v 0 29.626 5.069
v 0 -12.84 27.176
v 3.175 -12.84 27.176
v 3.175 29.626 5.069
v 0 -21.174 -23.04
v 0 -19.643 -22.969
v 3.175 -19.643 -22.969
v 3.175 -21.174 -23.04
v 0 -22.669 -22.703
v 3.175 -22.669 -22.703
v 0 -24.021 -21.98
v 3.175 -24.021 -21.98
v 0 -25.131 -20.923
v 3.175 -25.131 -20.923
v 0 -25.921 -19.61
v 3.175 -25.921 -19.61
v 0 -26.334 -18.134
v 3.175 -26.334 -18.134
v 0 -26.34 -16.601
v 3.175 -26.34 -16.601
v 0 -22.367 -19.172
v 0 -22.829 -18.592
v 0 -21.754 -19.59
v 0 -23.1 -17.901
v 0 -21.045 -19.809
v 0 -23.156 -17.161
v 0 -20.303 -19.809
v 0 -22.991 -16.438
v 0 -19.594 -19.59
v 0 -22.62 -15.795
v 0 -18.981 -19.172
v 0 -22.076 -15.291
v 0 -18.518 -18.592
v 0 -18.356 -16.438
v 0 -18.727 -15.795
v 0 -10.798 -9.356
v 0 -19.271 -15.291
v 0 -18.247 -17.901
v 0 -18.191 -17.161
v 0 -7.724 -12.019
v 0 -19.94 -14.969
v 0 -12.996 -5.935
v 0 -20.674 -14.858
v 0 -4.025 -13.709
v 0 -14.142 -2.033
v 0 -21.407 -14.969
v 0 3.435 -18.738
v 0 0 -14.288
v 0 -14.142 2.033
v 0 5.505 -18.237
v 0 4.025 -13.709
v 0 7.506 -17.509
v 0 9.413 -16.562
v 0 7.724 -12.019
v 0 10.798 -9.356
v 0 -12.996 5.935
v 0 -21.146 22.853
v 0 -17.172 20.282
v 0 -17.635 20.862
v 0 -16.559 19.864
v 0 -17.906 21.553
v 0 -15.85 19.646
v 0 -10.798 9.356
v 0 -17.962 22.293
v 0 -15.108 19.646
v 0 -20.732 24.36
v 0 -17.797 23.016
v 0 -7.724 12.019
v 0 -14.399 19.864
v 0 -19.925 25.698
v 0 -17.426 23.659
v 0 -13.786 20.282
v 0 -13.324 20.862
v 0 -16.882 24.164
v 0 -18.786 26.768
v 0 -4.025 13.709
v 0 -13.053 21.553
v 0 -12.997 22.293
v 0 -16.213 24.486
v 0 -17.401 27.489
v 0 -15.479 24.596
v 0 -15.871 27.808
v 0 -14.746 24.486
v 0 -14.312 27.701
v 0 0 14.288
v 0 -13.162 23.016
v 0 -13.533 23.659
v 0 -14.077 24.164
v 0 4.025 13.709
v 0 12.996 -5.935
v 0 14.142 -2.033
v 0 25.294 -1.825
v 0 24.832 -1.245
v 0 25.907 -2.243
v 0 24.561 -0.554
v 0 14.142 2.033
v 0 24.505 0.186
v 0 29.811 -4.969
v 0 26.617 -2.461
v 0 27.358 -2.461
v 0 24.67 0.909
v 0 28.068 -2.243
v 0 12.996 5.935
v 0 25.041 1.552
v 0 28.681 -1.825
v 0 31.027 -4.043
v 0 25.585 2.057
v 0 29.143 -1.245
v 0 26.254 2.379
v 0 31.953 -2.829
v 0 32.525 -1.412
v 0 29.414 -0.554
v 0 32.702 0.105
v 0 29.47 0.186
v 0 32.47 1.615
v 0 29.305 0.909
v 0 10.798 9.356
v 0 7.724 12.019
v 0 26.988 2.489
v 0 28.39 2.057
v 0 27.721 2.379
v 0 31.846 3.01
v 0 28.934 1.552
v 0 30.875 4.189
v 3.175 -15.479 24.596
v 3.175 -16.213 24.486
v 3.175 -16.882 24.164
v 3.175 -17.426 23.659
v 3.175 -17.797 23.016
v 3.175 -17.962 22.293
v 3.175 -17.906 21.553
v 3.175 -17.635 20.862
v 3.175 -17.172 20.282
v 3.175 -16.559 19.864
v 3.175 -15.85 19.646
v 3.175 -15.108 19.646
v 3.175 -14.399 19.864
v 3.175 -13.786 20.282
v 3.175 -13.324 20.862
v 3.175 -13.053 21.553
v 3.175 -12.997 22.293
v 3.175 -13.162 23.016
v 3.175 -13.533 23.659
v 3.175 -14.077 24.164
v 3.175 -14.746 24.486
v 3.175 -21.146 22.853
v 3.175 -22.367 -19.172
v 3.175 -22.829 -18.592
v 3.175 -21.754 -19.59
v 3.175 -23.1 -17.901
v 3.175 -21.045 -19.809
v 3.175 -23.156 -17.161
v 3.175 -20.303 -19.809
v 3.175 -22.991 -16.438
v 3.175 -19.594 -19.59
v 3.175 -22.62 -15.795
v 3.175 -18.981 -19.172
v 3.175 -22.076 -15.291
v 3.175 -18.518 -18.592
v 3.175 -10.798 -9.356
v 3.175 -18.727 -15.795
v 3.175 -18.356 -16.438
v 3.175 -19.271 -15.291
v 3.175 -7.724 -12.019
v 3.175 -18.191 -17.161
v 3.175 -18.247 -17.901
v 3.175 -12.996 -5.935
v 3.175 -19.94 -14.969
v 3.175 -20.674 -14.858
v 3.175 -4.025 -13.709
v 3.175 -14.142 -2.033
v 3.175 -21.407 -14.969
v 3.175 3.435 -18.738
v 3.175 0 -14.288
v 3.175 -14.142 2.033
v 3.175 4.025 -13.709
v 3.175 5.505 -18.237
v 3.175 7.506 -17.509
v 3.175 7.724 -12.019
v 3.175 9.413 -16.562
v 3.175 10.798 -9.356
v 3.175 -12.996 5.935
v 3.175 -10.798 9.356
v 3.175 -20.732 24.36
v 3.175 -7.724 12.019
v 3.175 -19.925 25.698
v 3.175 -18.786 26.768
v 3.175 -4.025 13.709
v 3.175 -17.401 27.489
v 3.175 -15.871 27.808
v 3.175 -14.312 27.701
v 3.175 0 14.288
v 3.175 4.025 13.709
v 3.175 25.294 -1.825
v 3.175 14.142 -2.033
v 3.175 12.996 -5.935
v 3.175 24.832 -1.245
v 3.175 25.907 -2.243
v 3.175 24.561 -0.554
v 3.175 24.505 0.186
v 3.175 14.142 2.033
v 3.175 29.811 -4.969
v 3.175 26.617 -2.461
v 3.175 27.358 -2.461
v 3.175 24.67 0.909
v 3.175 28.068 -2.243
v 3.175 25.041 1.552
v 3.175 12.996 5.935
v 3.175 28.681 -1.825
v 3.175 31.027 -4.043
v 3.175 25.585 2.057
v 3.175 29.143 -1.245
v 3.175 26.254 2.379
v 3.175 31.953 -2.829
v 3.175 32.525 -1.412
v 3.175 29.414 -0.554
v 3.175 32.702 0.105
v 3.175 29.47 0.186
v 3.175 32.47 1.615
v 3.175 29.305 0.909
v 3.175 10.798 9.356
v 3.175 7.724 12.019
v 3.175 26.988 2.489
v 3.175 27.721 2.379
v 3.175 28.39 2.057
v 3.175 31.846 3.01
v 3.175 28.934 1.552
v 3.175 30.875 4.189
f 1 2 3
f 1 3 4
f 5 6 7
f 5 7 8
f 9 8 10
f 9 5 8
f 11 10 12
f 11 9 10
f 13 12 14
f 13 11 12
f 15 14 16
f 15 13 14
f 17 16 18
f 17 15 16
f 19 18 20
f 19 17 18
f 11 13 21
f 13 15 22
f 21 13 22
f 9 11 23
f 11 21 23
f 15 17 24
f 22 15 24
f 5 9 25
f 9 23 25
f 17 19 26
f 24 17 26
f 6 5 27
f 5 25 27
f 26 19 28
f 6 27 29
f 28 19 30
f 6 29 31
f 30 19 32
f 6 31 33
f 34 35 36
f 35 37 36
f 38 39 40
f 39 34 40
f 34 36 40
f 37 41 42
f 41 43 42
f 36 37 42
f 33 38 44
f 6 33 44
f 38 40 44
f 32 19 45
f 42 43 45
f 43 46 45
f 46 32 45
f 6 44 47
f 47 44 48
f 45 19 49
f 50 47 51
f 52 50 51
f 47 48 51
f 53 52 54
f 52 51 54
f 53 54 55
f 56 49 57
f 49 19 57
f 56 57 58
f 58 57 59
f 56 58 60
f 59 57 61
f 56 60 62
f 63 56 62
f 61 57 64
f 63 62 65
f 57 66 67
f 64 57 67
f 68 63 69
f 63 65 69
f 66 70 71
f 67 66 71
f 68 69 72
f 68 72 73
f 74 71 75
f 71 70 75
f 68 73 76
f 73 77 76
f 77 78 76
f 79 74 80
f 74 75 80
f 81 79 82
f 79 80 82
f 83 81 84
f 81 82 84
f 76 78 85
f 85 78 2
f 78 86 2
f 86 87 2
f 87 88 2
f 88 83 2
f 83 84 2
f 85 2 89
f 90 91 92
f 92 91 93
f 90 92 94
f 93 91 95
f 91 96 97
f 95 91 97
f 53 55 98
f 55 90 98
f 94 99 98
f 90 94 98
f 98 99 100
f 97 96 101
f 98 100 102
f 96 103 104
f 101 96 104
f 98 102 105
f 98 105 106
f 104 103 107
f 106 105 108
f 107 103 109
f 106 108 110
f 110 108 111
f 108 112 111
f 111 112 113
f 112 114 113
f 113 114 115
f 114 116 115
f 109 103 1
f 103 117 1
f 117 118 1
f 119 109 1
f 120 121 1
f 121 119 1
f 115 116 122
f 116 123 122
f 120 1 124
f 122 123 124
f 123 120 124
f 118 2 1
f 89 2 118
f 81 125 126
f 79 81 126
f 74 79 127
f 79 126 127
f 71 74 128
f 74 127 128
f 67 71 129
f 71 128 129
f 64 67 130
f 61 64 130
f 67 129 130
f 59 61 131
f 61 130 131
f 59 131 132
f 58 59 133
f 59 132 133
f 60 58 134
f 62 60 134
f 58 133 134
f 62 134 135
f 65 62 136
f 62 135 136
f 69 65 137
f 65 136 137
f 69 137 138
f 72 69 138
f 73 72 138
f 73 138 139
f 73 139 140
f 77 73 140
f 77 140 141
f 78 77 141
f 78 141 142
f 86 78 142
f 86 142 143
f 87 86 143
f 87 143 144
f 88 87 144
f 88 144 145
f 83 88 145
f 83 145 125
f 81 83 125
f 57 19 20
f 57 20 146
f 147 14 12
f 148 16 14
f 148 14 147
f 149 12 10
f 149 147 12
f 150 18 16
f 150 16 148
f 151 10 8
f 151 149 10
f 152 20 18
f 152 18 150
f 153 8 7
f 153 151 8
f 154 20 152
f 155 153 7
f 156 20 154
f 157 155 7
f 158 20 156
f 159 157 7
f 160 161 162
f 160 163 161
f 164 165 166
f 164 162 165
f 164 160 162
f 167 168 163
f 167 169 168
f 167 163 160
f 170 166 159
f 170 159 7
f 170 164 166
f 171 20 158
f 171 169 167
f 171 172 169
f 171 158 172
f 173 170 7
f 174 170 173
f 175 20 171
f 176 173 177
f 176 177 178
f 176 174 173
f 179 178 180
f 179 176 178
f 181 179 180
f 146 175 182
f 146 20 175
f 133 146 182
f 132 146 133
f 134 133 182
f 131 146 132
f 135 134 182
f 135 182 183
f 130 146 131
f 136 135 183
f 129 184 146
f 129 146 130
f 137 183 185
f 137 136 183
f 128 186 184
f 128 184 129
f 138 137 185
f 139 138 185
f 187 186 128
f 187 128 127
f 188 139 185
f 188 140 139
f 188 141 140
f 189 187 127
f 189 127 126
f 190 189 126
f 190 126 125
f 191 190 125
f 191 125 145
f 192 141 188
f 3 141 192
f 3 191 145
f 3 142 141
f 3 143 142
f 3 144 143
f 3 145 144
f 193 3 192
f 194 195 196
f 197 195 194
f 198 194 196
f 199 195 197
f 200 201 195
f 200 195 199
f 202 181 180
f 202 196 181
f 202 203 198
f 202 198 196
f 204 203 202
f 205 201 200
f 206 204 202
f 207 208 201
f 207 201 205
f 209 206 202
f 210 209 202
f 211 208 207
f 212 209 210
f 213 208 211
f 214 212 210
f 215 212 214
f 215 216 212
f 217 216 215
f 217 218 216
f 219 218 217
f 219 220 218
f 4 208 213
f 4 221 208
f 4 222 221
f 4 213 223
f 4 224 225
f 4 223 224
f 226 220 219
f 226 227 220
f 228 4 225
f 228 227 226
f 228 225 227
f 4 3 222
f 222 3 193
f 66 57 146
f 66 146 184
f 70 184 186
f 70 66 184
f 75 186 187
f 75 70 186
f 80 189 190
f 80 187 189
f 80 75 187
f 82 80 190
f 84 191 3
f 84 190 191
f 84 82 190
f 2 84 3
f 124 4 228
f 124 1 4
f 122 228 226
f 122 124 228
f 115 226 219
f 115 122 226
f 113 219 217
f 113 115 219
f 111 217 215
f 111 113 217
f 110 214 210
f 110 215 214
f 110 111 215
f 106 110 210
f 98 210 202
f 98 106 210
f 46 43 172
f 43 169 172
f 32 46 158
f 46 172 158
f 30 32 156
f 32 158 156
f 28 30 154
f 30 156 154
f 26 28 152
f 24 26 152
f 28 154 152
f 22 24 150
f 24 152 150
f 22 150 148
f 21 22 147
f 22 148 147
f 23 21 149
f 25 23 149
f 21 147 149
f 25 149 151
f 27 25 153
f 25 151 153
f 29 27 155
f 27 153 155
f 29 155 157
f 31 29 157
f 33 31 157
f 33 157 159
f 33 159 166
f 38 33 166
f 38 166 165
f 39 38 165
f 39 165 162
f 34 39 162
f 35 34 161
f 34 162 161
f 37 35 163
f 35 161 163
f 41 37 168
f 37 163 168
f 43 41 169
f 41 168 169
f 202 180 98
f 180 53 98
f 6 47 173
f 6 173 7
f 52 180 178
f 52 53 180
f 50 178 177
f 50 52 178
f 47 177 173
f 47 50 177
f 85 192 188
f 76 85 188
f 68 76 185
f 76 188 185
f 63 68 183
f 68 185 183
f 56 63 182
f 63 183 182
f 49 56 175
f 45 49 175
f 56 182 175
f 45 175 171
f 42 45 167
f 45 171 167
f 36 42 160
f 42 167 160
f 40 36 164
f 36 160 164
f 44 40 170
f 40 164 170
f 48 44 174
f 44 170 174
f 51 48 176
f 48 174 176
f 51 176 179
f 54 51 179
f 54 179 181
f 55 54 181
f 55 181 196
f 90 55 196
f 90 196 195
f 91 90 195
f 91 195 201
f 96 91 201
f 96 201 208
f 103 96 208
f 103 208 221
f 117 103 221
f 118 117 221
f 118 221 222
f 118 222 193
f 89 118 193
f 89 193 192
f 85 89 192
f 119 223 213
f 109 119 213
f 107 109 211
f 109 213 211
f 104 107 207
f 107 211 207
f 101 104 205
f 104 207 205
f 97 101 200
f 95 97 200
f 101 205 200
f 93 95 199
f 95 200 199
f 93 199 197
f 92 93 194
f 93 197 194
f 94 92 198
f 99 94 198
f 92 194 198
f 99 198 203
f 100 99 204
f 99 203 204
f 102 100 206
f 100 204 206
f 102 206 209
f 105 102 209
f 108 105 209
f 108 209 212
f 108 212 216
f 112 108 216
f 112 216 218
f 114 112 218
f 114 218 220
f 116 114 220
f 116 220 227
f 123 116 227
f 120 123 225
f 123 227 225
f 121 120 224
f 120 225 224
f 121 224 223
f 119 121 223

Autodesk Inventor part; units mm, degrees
ref_plane "YZ Plane" through (0, 0, 0) normal (1, 0, 0) x (0, 1, 0)
ref_plane "XZ Plane" through (0, 0, 0) normal (0, 1, 0) x (-1, 0, 0)
ref_plane "XY Plane" through (0, 0, 0) normal (0, 0, 1) x (1, 0, 0)
sketch "Sketch1" plane through (0, 0, 0) normal (1, 0, 0) x (0, 1, 0)
  line L0 (-15.4794, 22.1069) -> (0, 0) construction
  line L1 (0, 0) -> (26.9875, 0) construction
  line L2 (0, 0) -> (-20.6736, -17.3472) construction
  arc A0 (-12.8405, 27.1761) -> (-21.1455, 22.8528) centre (-15.4794, 22.1069) ccw
  arc A1 (-26.3397, -16.6013) -> (-19.6431, -22.9686) centre (-20.6736, -17.3472) ccw
  arc A2 (29.8114, -4.9686) -> (29.6264, 5.0693) centre (26.9875, 0) ccw
  circle A3 centre (0, 0) radius 14.2875 construction
  line L3 (9.4129, -16.562) -> (29.8114, -4.9686)
  arc A4 (3.4351, -18.7377) -> (9.4129, -16.562) centre (0, 0) ccw
  line L4 (3.4351, -18.7377) -> (-19.6431, -22.9686)
  line L5 (-26.3397, -16.6013) -> (-21.1455, 22.8528)
  line L6 (-12.8405, 27.1761) -> (29.6264, 5.0693)
  line L7 (0, 0) -> (0, -5.4993)
  dimension "d0" = 26.9875
  dimension "d1" = 95
  dimension "d2" = 5.715
  dimension "d3" = 28.575
  dimension "d22" = 19.05
  dimension "d23" = 50
extrude "Plate1" add sketch "Sketch1" along normal blind 3.175
hole "Hole1" at (0, 0, 0) direction (1, 0, 0) diameter 28.575 depth 3.175 tip angle 118
hole "Hole2" at (0, 26.9875, 0) at (0, -15.4794, 22.1069) at (0, -20.6736, -17.3472) direction (1, 0, 0) diameter 4.9784 depth 3.175 tip angle 118 clearance for "Flat Head Machine Screw (82)" size "#10" standard "Ansi Unified Screw Threads"
equation "\"d11\" = Thickness"
equation "\"d18\" = Thickness"
equation "\"d5\" = Thickness"
equation "\"BendRadius\" = Thickness"
equation "\"BendReliefWidth\" = Thickness"
equation "\"BendReliefDepth\" = 0.5 * Thickness"
equation "\"CornerReliefSize\" = 4 * Thickness"
equation "\"MinimumRemnant\" = 2 * Thickness"
equation "\"TransitionRadius\" = BendRadius"
equation "\"JacobiRadiusSize\" = BendRadius"
equation "\"GapSize\" = Thickness"
equation "\"Thickness\" = 3.175"
properties part number "PLATE,REVERSER,SUPPORT" material "Aluminum 6061"
